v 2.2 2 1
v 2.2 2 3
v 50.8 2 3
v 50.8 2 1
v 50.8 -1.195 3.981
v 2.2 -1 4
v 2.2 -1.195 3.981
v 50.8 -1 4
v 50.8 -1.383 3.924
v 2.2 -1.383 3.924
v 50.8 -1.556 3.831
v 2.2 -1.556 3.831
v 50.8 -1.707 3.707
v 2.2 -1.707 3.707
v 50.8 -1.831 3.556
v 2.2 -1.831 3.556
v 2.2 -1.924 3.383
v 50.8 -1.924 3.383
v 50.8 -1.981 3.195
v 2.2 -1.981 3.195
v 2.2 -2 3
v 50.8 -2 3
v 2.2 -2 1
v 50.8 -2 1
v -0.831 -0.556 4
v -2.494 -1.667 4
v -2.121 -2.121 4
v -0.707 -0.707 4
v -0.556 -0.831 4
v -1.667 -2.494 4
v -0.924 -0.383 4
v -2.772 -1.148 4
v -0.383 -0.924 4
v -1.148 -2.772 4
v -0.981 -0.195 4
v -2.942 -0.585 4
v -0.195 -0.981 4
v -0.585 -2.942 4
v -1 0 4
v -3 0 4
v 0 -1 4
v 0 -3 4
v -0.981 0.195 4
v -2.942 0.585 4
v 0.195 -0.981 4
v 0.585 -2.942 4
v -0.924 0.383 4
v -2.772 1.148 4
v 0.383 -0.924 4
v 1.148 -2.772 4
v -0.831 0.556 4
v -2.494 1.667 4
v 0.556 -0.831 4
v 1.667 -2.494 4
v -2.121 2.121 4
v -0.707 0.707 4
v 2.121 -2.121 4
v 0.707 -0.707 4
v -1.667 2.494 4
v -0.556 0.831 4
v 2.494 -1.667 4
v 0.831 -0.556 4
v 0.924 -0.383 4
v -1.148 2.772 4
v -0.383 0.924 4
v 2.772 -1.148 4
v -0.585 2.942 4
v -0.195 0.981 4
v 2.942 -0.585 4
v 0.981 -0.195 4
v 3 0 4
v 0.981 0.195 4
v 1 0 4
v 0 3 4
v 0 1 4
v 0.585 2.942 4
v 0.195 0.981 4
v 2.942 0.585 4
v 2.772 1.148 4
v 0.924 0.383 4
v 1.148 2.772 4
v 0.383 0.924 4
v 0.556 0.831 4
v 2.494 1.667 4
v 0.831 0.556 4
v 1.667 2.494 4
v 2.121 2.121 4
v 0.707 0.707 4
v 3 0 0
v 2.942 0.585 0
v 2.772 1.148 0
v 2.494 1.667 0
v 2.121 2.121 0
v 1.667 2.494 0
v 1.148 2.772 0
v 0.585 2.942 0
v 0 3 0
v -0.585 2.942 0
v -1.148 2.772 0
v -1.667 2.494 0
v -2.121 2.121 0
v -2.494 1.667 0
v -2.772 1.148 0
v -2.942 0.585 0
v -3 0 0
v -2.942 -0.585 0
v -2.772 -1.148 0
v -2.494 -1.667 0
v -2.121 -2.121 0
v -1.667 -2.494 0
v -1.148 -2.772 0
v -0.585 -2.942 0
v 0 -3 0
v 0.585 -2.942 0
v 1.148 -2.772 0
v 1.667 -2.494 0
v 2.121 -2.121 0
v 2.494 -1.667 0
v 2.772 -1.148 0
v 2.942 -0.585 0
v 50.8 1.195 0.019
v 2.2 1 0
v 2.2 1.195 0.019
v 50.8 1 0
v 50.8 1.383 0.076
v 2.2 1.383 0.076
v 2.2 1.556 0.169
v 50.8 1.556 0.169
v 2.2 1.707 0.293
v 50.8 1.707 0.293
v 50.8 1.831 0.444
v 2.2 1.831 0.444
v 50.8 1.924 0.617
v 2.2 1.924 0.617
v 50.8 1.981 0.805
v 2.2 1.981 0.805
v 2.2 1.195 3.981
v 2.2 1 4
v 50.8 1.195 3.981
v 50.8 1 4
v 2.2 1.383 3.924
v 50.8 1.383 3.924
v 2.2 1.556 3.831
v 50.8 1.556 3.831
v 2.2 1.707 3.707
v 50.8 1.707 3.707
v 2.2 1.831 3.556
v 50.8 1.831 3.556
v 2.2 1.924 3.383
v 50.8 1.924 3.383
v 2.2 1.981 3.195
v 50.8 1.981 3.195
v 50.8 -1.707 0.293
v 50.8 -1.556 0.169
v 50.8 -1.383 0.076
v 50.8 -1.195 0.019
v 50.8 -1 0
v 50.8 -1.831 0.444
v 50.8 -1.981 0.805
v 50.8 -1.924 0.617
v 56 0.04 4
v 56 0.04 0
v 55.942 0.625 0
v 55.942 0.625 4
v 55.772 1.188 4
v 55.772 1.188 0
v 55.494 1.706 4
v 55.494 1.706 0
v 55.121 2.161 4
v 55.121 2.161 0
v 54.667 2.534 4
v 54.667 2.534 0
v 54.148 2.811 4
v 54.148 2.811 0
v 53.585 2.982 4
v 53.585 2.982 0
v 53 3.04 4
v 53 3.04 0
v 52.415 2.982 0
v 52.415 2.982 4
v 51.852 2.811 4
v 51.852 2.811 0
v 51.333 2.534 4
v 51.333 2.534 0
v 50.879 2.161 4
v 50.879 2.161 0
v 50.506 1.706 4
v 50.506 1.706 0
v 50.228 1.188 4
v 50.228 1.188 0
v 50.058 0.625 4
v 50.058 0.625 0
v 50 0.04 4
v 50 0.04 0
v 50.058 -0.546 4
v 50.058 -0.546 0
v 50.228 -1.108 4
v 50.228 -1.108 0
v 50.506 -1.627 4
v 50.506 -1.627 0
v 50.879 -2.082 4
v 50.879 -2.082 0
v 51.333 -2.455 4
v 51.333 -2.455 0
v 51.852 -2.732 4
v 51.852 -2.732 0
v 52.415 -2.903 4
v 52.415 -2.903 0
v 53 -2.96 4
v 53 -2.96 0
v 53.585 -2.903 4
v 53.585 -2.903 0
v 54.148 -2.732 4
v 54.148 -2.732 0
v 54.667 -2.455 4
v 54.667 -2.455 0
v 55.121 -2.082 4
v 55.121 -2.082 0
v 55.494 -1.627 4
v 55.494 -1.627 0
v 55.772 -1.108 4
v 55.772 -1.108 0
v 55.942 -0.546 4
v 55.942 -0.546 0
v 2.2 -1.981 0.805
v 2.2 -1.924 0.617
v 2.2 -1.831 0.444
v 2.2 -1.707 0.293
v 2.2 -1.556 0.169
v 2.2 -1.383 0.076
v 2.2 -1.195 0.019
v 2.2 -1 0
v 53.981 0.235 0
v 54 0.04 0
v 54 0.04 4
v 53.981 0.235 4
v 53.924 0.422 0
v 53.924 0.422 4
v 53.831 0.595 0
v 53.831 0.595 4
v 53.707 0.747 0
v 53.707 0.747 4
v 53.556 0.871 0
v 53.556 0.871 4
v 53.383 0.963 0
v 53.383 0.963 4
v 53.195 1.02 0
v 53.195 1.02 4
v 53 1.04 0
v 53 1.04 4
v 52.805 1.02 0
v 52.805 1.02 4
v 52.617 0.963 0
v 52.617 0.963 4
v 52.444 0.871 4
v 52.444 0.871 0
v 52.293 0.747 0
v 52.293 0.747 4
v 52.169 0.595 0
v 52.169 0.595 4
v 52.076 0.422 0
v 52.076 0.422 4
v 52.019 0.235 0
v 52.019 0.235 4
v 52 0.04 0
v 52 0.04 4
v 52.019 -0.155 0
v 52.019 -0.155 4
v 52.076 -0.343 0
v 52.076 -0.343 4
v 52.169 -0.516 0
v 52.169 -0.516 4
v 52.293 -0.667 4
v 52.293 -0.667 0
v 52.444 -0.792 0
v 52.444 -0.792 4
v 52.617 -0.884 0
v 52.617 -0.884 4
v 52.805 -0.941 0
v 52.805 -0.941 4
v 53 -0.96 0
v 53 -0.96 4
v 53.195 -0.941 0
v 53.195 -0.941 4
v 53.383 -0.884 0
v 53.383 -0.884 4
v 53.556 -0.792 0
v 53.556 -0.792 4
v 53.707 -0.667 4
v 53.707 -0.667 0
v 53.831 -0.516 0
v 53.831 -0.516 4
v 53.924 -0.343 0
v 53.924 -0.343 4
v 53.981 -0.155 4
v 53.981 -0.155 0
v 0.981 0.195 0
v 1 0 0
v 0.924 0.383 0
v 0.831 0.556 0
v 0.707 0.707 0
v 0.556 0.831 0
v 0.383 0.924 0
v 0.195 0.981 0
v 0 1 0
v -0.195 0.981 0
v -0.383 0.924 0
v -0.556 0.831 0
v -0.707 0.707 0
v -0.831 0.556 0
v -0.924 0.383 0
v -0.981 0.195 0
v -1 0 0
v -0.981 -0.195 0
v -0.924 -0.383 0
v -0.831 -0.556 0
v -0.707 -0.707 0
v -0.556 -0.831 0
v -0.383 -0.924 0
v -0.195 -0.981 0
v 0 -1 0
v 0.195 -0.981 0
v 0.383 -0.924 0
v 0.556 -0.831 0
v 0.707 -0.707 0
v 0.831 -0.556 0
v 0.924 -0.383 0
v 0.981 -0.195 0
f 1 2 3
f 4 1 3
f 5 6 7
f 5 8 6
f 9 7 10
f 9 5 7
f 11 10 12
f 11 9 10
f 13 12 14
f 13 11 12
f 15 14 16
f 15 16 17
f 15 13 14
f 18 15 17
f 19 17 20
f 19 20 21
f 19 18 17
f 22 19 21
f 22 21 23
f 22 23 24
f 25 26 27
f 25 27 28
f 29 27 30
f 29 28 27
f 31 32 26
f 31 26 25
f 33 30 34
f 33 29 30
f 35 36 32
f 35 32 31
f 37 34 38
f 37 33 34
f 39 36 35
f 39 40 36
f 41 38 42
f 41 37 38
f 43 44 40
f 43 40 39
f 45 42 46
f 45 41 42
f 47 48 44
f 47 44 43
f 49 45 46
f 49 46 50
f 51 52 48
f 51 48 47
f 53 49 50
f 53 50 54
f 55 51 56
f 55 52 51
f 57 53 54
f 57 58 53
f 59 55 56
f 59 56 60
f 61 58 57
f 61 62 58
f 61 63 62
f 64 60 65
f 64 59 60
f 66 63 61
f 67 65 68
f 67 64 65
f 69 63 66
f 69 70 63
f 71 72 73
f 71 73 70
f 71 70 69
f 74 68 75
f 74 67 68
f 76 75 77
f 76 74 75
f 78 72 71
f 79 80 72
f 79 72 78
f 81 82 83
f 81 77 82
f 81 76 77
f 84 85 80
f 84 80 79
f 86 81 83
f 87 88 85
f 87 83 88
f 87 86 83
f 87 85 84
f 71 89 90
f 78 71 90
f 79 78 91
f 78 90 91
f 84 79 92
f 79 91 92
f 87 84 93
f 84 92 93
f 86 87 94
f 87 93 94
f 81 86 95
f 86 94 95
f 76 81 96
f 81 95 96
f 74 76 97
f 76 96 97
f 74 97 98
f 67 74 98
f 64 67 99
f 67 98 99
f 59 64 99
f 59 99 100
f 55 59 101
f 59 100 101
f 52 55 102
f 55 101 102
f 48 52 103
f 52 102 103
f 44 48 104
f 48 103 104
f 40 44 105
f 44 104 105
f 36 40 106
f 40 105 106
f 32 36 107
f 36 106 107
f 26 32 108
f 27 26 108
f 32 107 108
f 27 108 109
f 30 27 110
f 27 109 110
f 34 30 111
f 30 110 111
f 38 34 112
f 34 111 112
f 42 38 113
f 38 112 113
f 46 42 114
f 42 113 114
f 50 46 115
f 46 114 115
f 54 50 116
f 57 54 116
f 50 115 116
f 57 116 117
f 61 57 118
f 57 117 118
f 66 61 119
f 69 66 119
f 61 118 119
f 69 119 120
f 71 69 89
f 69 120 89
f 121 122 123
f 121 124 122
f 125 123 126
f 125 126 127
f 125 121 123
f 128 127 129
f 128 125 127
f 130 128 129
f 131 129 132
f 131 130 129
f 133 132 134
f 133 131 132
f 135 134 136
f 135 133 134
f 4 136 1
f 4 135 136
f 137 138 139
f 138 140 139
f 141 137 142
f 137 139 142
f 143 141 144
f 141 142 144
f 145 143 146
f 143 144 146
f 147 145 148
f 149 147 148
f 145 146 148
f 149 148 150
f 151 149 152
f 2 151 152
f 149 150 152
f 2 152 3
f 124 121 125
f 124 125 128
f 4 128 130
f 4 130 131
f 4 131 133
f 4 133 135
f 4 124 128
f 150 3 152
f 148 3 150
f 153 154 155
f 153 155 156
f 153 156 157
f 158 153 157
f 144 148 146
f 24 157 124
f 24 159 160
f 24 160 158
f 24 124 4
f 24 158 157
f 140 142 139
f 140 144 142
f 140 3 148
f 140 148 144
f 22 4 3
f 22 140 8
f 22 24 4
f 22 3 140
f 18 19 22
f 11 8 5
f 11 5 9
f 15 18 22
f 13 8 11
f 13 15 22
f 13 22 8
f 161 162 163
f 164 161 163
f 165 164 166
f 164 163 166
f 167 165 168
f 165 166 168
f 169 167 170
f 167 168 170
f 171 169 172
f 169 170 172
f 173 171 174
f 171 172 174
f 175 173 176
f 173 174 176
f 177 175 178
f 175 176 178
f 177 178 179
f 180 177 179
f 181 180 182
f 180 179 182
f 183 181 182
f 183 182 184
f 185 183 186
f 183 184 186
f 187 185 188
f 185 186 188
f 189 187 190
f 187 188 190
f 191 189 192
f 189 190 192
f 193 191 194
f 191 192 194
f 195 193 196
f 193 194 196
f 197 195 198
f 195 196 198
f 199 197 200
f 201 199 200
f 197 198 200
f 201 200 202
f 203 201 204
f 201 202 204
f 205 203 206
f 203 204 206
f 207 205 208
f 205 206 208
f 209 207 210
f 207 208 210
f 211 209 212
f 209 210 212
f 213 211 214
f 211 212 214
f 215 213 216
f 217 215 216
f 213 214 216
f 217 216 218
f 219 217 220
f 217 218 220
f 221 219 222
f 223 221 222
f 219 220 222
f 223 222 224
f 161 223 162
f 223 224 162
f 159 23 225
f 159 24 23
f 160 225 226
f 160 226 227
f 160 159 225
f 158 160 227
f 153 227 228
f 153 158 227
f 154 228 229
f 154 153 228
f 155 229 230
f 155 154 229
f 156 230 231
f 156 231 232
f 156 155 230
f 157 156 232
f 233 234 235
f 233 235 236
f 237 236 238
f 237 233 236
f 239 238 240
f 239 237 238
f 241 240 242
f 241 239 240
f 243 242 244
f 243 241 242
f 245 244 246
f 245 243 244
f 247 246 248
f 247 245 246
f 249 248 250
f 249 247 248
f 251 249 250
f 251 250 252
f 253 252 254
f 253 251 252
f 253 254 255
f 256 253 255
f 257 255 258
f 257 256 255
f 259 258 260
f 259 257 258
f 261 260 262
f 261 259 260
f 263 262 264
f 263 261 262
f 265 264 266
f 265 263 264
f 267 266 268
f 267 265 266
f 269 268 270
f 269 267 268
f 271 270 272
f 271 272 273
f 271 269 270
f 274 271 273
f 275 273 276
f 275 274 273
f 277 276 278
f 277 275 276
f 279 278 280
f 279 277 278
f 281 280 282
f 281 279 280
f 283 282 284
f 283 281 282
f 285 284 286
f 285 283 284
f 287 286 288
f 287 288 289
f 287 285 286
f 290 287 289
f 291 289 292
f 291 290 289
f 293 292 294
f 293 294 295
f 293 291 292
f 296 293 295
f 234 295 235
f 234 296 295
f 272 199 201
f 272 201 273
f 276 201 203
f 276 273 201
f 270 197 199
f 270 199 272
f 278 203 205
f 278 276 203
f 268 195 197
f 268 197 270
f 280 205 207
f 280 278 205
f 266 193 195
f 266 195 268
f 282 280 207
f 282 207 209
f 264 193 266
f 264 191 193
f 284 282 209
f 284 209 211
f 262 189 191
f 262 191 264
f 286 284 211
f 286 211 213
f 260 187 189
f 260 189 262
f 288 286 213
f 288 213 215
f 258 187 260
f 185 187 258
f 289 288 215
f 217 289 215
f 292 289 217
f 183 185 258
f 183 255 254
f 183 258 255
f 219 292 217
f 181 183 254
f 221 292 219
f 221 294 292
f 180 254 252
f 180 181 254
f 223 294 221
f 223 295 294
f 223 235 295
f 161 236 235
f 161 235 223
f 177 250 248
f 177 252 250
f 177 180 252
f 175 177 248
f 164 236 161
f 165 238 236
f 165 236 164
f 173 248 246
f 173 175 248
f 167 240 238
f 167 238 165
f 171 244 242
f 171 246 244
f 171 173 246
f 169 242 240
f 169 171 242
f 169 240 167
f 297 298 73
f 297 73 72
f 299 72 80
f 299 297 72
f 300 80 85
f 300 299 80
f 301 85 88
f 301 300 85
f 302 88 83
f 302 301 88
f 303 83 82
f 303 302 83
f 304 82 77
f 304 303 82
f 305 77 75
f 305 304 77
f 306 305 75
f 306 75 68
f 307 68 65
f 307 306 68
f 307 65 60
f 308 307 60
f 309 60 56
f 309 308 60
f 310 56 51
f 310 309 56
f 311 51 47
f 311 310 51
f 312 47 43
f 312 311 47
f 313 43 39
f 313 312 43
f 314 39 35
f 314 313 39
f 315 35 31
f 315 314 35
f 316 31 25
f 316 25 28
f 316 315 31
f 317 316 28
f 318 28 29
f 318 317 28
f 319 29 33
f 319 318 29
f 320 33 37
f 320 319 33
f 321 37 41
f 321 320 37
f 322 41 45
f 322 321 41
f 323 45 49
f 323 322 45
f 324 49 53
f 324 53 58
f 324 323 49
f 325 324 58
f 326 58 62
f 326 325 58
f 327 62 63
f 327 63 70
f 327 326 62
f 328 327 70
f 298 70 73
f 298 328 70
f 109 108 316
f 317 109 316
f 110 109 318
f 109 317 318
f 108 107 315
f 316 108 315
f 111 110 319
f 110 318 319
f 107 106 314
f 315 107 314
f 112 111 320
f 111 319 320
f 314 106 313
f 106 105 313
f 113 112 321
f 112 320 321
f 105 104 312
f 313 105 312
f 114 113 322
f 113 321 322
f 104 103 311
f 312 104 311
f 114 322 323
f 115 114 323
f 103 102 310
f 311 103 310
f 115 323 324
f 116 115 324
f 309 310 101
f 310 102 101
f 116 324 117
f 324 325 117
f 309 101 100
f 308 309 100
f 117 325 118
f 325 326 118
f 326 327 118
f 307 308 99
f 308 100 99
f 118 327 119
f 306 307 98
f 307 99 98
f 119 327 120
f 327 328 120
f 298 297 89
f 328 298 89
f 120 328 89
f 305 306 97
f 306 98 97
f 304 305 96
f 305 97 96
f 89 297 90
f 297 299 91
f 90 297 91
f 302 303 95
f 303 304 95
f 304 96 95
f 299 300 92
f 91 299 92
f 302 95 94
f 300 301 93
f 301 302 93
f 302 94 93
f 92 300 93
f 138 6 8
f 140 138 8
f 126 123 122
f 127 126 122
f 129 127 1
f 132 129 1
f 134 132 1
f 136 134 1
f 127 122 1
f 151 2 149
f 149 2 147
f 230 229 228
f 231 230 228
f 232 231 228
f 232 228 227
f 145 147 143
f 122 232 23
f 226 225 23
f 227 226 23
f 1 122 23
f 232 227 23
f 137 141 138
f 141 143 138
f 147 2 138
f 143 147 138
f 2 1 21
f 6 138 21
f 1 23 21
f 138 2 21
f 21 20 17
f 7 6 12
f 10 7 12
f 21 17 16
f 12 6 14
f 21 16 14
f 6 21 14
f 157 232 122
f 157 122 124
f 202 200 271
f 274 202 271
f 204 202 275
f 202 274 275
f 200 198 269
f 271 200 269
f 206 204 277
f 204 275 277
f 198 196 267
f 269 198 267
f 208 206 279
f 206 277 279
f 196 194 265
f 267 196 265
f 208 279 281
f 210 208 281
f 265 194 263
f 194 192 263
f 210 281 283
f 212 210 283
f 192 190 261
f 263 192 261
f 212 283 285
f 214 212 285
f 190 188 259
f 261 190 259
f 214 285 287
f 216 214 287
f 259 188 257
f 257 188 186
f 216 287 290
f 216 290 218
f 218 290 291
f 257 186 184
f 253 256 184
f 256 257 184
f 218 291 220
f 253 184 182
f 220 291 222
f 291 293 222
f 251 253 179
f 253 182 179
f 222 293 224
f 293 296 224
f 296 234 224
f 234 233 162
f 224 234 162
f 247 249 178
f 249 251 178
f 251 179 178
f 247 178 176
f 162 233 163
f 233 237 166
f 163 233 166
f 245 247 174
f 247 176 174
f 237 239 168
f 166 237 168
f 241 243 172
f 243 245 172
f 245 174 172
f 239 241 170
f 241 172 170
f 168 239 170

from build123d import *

# Parameters (mm, degrees)
SKETCH_R     = 3
SKETCH_R_2   = 1
PAD_DEPTH    = 4
SKETCH001_W  = 48.6
SKETCH001_H  = 4
PAD001_DEPTH = 2
FILLET_R     = 1
FILLET001_R  = 1
FILLET002_R  = 1
FILLET003_R  = 1


with BuildPart() as pad:
    # Sketch → Pad (new body)
    with BuildSketch(Plane.XY):
        Circle(SKETCH_R)
        Circle(SKETCH_R_2, mode=Mode.SUBTRACT)
        with Locations((53, 0.039615)):
            Circle(SKETCH_R)
        with Locations((53, 0.039615)):
            Circle(SKETCH_R_2, mode=Mode.SUBTRACT)
    extrude(amount=PAD_DEPTH)


with BuildPart() as fillet003:
    # Sketch001 → Pad001 (new body, symmetric)
    with BuildSketch(Plane.XZ):
        with Locations((26.5, 2)):
            Rectangle(SKETCH001_W, SKETCH001_H)
    extrude(amount=PAD001_DEPTH, both=True)

    # Fillet
    fillet_edges = [fillet003.edges().sort_by_distance(p)[0] for p in [
        (26.5, 2, 4),
    ]]
    fillet(fillet_edges, radius=FILLET_R)

    # Fillet001
    fillet001_edges = [fillet003.edges().sort_by_distance(p)[0] for p in [
        (26.5, -2, 4),
    ]]
    fillet(fillet001_edges, radius=FILLET001_R)

    # Fillet002
    fillet002_edges = [fillet003.edges().sort_by_distance(p)[0] for p in [
        (26.5, -2, 0),
    ]]
    fillet(fillet002_edges, radius=FILLET002_R)

    # Fillet003
    fillet003_edges = [fillet003.edges().sort_by_distance(p)[0] for p in [
        (26.5, 2, 0),
    ]]
    fillet(fillet003_edges, radius=FILLET003_R)


solid = Compound([pad.part, fillet003.part])
